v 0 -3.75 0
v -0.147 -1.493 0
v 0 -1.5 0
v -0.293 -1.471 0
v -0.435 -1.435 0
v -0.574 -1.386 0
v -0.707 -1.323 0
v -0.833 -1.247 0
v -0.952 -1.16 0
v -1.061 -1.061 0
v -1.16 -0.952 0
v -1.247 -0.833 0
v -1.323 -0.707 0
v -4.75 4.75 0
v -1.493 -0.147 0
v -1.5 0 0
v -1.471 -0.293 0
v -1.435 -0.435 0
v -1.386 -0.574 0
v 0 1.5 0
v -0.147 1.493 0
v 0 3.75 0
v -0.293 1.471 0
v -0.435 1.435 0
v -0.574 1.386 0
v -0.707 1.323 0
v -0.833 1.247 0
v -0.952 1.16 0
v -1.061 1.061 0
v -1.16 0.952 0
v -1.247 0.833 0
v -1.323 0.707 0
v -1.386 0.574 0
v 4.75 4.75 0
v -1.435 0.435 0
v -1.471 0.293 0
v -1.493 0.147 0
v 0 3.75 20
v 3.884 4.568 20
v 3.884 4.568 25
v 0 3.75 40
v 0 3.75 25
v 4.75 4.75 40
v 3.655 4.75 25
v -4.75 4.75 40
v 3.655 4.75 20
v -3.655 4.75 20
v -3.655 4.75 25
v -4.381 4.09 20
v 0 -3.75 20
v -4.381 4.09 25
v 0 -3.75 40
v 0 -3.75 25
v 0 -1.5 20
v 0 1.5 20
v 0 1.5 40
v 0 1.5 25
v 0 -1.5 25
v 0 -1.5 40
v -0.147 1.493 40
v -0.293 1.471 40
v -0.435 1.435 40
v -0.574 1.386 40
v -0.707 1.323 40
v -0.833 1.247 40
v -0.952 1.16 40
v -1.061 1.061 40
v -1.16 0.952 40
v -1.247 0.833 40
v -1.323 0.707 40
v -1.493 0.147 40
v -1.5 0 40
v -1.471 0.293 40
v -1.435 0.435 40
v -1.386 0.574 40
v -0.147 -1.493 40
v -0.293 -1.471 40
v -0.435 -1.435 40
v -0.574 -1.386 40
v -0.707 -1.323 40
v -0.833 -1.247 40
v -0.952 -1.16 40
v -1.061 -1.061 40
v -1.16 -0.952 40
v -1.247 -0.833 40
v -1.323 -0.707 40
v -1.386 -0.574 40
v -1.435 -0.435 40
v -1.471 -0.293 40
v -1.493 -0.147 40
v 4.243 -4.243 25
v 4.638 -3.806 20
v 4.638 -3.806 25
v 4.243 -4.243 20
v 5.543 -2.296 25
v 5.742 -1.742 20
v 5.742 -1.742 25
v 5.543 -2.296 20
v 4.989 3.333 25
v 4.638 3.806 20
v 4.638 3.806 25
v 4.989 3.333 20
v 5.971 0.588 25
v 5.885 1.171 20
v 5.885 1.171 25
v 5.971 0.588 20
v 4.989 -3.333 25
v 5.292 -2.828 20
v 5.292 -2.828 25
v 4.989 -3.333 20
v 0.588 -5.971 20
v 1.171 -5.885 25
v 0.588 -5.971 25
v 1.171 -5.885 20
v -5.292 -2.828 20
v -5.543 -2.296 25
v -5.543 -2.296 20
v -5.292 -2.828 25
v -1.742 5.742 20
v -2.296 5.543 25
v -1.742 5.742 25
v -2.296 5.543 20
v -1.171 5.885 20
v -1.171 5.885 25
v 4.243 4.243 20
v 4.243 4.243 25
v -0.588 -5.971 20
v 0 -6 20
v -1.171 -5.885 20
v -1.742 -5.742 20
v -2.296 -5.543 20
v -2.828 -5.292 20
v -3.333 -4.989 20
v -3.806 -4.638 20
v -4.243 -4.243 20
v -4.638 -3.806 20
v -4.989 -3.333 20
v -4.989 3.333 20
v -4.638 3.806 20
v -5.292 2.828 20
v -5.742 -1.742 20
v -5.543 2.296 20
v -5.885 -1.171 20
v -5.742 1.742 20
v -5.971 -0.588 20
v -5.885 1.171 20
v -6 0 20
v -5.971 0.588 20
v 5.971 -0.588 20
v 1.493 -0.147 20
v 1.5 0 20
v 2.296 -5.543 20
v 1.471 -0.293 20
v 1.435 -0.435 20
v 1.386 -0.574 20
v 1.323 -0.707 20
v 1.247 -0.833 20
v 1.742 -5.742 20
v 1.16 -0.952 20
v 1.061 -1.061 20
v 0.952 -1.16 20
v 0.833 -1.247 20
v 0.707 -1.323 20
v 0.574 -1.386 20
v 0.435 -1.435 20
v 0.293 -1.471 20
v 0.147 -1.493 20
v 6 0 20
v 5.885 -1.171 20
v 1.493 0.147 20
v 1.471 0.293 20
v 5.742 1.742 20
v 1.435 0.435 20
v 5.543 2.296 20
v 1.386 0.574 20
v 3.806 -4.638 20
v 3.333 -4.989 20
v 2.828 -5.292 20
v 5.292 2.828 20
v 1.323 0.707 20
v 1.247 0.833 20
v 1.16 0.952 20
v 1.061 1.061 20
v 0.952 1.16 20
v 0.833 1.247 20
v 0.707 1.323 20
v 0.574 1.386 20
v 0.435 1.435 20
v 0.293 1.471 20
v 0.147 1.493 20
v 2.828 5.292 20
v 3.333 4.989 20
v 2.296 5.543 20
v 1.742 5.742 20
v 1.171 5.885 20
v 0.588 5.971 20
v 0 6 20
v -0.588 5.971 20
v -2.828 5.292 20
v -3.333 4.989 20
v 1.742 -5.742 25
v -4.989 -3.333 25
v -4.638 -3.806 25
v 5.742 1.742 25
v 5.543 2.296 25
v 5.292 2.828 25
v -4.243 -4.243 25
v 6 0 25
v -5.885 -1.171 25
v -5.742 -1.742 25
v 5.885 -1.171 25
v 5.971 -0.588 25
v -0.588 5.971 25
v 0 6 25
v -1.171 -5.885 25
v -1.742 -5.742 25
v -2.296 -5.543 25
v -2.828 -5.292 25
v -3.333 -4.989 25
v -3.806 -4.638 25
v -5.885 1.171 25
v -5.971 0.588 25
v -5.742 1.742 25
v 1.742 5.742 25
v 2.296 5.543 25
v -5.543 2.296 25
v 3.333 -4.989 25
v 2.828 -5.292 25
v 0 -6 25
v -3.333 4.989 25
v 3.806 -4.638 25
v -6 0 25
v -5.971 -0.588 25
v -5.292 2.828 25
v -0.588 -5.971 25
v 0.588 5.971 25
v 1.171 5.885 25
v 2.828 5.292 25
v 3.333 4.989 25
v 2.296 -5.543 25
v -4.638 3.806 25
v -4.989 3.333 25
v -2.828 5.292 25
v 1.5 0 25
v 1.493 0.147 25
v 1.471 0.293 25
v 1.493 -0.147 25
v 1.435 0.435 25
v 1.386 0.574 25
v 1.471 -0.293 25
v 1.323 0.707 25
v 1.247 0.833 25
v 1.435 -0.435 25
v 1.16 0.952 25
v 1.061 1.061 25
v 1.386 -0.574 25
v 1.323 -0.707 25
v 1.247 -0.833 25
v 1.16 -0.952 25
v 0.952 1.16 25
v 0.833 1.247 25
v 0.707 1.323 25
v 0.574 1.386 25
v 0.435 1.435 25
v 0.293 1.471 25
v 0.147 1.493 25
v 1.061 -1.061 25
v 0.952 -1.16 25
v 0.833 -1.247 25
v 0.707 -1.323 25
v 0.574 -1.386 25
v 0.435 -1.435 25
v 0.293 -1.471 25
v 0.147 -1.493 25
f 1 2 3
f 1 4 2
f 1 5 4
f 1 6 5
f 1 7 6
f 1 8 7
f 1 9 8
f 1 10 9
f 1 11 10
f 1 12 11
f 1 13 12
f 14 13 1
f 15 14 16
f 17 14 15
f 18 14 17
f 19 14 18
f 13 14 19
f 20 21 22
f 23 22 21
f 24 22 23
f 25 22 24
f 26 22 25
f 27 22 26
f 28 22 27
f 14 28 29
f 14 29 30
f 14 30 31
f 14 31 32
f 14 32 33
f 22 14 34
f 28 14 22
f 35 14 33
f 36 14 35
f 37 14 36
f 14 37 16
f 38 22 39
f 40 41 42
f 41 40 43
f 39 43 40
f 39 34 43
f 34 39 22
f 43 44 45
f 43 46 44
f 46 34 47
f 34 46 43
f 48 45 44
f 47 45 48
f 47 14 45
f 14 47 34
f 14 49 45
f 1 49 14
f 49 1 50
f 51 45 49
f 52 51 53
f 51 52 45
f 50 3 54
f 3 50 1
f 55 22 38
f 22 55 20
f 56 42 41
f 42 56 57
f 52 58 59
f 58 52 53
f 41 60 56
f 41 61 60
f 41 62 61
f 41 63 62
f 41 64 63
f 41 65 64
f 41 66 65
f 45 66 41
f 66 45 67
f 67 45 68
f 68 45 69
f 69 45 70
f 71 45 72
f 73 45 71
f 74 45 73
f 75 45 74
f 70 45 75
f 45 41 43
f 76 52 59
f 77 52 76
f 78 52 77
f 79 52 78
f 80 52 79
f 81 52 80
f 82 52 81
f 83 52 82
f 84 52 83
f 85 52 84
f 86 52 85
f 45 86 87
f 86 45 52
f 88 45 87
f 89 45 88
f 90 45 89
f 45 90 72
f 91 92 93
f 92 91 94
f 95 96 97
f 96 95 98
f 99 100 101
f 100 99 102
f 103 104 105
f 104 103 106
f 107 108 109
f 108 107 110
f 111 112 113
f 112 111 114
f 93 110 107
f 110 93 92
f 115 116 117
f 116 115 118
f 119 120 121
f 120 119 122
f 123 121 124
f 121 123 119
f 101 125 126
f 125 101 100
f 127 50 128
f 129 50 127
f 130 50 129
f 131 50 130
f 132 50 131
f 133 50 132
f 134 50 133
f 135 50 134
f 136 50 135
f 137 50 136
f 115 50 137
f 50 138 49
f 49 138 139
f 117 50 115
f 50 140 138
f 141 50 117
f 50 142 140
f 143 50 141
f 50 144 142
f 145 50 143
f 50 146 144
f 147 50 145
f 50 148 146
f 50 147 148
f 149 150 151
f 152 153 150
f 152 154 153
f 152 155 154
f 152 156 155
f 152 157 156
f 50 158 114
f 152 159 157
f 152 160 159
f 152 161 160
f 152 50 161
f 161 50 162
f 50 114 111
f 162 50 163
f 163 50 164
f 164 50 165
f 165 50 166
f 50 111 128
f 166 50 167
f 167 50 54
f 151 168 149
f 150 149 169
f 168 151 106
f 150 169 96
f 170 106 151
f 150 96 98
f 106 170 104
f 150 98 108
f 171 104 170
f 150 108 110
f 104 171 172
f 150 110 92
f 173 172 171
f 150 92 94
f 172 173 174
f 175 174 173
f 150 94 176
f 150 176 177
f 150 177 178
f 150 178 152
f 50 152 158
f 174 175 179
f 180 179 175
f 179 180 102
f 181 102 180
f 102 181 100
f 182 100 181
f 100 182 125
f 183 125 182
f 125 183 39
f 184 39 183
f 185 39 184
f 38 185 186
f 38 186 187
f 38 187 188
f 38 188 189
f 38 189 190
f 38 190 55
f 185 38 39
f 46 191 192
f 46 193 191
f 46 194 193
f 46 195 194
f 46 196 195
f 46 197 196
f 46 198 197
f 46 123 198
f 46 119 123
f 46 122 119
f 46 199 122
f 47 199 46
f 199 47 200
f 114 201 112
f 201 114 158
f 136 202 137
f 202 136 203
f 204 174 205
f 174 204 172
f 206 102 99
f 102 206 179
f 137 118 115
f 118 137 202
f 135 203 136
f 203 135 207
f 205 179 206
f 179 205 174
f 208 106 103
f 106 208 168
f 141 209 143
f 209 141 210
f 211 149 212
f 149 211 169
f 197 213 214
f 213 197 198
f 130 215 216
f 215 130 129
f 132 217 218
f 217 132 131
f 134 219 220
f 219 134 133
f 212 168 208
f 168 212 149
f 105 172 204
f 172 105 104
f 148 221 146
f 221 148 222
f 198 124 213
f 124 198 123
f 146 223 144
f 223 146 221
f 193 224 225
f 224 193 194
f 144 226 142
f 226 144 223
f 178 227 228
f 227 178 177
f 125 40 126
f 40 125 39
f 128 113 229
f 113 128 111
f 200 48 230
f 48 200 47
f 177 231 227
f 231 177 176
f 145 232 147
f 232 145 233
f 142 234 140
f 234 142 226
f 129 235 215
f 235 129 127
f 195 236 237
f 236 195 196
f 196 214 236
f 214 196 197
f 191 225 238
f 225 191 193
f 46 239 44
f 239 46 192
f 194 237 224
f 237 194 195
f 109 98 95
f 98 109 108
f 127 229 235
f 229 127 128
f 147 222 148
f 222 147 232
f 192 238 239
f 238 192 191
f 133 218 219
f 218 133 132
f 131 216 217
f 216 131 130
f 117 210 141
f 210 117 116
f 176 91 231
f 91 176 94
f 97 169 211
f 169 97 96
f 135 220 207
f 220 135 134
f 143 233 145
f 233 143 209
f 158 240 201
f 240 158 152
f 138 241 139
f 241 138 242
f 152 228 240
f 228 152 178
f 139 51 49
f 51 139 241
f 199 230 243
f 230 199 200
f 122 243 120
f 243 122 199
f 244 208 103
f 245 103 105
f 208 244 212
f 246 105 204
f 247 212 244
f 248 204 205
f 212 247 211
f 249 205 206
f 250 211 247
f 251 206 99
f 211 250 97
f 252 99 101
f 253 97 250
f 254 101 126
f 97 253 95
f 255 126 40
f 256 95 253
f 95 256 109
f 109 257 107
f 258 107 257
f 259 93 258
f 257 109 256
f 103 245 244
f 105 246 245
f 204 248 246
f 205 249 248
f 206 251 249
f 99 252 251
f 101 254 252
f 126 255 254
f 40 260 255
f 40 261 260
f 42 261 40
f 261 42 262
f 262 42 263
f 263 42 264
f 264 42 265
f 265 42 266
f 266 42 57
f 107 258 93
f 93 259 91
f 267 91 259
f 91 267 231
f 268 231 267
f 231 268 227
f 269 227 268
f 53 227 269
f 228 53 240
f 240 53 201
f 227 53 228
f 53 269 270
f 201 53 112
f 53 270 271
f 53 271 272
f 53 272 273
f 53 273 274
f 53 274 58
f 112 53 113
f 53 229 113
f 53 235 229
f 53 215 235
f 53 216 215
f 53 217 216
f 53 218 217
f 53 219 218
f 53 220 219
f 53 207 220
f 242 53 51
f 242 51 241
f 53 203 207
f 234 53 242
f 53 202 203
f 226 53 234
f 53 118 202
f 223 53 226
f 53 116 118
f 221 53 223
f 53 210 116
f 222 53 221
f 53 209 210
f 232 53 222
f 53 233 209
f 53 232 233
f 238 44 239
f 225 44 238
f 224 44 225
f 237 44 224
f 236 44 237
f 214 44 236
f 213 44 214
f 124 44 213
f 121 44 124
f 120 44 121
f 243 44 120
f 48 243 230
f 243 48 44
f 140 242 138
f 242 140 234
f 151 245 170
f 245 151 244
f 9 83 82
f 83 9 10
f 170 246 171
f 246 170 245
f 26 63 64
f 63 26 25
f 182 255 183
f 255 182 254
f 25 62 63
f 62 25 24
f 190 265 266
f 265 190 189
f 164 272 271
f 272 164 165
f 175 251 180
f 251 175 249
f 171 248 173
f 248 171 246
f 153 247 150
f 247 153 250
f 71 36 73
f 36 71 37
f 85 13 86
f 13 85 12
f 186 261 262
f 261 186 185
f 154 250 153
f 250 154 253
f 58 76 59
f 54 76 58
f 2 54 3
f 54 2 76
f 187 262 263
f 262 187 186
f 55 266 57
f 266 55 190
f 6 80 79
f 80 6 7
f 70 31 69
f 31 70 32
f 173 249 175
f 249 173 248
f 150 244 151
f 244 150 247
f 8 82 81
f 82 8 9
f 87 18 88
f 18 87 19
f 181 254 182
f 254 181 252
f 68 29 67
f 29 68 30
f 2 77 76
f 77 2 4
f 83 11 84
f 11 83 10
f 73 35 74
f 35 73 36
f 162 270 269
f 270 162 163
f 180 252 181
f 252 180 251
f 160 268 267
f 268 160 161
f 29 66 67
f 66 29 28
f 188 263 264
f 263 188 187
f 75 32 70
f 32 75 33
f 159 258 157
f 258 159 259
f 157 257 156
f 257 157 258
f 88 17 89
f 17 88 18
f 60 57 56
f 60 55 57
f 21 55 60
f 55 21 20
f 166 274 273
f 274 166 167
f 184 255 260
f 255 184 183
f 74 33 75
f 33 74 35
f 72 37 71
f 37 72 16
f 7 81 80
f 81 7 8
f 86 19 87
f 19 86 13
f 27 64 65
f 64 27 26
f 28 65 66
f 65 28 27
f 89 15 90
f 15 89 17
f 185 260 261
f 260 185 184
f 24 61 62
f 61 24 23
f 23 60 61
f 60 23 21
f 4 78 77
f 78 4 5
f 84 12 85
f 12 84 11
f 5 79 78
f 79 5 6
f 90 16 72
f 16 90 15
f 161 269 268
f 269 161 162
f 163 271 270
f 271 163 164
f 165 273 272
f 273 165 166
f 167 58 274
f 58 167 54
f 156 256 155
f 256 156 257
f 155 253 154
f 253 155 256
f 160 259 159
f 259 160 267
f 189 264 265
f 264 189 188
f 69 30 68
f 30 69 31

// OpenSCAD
// Hose-barb reducer: 8 mm ID tubing -> 5 mm ID tubing
// Print orientation: standing upright along Z

$fn = 64;

// ---- 8 mm tubing barbs (z = 0 to 20) ----
barb_h_8 = 20;      // total height of stacked barbs
barb_od_bottom_8 = 7.5;  // outer diameter at bottom of barbs
barb_od_top_8 = 9.5;   // outer diameter at top of barbs
barb_count_8 = 2;     // two barbs, stacked

// ---- 5 mm tubing barbs (z = 25 to 41) ----
barb_h_5 = 16;       // total height of stacked barbs (8 mm each)
barb_od_bottom_5 = 6.5;  // outer diameter at bottom of barbs
barb_od_top_5 = 5.0;   // outer diameter at top of barbs
barb_count_5 = 2;     // two barbs, stacked

// ---- Collar (z = 20 to 25) ----
collar_d = 12;       // collar diameter
collar_h = 5;        // collar height

// ---- Through bore ----
bore_d = 3;          // full-length bore diameter

// ---- Derived ----
barb_w = 1.5;        // wall thickness (used for stepping back)
step_od_8 = barb_od_top_8 - barb_w;   // outer diameter after step down
step_od_5 = barb_od_bottom_5 + barb_w; // outer diameter after step up

module barbs_8() {
    for (i = [0 : barb_count_8 - 1]) {
        translate([0, 0, i * barb_h_8 / (barb_count_8 - 1)])
            linear_extrude(height = barb_h_8 / (barb_count_8 - 1))
                polygon([
                    [0, -barb_od_bottom_8 / 2],
                    [0, barb_od_bottom_8 / 2],
                    [barb_od_top_8 / 2, barb_od_top_8 / 2],
                    [-barb_od_top_8 / 2, barb_od_top_8 / 2]
                ]);
    }
}

module barbs_5() {
    for (i = [0 : barb_count_5 - 1]) {
        translate([0, 0, 25 + i * barb_h_5 / (barb_count_5 - 1)])
            linear_extrude(height = barb_h_5 / (barb_count_5 - 1))
                polygon([
                    [0, -step_od_5 / 2],
                    [0, step_od_5 / 2],
                    [barb_od_bottom_5 / 2, barb_od_bottom_5 / 2],
                    [-barb_od_bottom_5 / 2, barb_od_bottom_5 / 2]
                ]);
    }
}

difference() {
    union() {
        // 8 mm tubing barbs
        barbs_8();
        // Collar
        translate([0, 0, 20])
            cylinder(d = collar_d, h = collar_h);
        // 5 mm tubing barbs
        barbs_5();
    }
    // Through bore
    translate([0, 0, -1])
        cylinder(d = bore_d, h = 43);
}
